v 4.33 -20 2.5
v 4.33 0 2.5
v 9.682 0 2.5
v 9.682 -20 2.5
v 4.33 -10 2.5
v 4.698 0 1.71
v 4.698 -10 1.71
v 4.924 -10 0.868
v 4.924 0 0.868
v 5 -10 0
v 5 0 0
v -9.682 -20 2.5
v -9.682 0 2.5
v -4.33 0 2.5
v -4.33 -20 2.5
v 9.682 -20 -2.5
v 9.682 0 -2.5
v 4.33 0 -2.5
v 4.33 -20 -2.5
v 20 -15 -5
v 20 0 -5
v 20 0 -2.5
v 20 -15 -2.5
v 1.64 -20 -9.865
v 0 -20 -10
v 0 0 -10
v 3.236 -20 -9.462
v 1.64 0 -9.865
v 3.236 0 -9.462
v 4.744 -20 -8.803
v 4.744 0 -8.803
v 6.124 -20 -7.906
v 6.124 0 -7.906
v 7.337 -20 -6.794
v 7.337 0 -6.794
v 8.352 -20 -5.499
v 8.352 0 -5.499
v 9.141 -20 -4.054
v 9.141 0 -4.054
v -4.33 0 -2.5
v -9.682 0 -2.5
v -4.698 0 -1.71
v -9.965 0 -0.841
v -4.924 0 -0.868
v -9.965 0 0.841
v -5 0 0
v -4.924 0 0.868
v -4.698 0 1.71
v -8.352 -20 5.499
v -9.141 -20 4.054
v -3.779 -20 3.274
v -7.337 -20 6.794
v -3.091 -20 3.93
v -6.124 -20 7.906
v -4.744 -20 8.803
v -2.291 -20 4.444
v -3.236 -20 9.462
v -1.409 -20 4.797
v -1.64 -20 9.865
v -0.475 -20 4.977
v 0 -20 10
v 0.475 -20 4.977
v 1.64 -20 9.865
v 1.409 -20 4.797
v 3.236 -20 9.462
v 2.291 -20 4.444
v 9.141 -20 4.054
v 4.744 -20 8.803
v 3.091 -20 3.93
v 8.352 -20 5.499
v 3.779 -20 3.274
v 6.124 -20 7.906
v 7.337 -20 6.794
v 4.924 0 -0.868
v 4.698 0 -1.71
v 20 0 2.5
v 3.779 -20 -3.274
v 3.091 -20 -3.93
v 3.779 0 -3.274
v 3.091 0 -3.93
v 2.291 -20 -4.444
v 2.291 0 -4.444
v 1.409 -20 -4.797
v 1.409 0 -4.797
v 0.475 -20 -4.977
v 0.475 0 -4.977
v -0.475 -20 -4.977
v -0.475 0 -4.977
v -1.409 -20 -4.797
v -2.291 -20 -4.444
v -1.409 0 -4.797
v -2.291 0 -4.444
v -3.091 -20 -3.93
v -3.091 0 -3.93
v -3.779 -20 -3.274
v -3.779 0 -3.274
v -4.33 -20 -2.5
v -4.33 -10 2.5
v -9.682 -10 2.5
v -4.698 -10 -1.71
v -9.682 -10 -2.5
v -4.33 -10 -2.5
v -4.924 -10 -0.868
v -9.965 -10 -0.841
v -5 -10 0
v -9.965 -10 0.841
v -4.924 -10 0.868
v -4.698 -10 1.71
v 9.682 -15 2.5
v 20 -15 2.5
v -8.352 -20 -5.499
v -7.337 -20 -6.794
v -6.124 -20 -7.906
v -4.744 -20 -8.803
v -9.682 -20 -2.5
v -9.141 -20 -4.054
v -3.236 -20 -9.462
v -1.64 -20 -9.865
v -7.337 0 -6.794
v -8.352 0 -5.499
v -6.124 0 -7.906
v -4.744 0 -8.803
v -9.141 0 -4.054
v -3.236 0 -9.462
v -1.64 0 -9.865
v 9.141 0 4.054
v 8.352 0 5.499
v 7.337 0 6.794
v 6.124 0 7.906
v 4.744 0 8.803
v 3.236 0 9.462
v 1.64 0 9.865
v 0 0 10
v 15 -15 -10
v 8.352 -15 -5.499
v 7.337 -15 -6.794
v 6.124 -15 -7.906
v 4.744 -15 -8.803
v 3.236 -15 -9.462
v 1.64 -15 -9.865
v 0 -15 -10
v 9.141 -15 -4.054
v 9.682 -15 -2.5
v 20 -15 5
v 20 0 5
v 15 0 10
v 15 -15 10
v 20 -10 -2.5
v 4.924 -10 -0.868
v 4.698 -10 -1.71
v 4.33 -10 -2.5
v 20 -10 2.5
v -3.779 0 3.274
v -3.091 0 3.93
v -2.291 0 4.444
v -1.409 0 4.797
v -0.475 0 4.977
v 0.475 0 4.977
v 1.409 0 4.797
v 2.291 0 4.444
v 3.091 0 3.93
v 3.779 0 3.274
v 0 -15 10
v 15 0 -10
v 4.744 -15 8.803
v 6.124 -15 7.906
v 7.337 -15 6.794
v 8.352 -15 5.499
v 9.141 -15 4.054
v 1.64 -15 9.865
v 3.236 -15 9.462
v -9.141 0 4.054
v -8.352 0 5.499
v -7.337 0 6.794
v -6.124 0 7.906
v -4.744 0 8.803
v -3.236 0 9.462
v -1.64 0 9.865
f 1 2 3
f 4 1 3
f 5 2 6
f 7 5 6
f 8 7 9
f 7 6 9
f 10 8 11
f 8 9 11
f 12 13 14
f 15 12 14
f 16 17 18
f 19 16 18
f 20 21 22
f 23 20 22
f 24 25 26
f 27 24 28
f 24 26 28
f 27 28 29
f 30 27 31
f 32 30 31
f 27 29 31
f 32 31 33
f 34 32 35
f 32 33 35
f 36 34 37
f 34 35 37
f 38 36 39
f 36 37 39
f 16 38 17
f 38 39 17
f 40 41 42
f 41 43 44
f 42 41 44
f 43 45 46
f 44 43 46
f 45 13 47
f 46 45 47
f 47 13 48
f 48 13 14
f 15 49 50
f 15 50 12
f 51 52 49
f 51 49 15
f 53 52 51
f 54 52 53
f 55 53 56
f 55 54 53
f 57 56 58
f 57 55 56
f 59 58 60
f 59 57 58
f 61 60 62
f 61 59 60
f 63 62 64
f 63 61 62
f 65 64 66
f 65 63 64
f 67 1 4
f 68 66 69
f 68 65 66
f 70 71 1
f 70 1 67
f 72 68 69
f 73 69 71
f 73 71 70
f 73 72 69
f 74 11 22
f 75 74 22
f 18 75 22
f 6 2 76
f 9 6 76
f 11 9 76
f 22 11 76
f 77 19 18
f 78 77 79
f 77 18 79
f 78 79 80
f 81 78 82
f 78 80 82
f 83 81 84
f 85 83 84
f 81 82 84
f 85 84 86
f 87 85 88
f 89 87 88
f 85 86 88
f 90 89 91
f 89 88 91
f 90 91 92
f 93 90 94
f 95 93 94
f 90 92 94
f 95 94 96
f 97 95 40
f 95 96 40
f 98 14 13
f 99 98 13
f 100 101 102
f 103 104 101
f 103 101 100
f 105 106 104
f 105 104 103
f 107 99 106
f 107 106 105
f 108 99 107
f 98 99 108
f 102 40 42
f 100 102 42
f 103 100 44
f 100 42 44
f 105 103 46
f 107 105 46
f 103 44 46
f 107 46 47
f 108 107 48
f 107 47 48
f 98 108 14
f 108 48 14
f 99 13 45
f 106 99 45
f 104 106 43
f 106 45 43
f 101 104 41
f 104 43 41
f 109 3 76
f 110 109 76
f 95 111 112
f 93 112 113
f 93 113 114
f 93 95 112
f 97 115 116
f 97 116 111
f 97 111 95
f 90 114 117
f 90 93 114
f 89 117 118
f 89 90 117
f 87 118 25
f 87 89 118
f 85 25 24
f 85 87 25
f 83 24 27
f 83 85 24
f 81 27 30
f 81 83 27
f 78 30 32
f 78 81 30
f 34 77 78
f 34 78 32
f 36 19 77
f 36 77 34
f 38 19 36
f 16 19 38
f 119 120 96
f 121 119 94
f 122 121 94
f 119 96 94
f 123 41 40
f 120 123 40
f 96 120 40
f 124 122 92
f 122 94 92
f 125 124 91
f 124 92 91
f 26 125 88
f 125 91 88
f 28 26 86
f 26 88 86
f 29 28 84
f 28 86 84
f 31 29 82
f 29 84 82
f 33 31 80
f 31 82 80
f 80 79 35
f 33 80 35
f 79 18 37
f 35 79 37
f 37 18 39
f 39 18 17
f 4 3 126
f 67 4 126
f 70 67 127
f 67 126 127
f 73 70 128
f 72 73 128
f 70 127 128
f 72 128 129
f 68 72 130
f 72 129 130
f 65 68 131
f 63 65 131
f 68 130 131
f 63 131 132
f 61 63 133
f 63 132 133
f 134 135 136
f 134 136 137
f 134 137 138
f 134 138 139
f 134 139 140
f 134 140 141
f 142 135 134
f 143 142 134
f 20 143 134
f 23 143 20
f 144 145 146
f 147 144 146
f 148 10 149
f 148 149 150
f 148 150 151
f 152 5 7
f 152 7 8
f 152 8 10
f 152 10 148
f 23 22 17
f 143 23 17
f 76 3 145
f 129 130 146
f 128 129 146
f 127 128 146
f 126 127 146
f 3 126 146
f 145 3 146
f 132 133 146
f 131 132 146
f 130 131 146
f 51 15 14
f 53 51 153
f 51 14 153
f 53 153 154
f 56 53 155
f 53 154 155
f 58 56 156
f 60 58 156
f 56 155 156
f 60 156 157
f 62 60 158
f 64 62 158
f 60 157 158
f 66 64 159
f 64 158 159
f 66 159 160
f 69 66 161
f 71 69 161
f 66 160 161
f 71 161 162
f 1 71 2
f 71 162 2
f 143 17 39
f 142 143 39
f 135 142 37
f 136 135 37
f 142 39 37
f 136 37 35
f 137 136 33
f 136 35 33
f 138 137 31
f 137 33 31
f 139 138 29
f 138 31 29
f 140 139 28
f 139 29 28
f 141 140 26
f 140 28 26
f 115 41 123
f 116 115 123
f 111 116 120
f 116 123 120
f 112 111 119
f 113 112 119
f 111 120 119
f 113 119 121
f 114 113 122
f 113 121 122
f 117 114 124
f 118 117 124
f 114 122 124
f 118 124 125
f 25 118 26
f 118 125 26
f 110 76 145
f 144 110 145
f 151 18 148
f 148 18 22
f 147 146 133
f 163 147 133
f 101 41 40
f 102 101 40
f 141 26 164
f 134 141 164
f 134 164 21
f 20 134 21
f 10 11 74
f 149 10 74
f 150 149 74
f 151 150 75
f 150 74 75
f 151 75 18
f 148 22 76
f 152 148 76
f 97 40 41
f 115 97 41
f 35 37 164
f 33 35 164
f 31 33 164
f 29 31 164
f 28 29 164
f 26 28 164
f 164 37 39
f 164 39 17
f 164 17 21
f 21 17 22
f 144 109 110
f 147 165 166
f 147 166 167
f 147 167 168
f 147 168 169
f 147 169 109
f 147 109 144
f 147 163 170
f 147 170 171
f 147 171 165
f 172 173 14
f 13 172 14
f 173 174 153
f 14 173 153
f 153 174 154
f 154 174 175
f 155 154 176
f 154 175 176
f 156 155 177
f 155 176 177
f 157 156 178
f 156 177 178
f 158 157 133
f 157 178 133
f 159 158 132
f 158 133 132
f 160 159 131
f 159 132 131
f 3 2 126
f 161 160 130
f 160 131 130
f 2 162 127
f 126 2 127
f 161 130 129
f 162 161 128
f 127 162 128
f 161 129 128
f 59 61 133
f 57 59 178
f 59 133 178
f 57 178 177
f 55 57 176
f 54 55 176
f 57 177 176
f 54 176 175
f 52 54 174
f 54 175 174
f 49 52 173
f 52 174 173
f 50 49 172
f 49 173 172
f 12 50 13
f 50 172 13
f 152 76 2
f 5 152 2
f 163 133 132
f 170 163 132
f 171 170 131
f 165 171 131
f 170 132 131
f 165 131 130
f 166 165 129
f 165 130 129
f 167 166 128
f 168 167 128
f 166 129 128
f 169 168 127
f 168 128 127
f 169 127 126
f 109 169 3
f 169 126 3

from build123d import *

# Parameters (mm, degrees)
F1_DEPTH = 20
F2_DEPTH = 10
F3_DEPTH = 15


with BuildPart() as f1:
    # F0 (on Front) → F1 (new body)
    with BuildSketch(Plane.XZ):
        with BuildLine():
            ThreePointArc((-4.330127, 2.5), (0, 5), (4.330127, 2.5))
            Line((4.330127, 2.5), (9.682458, 2.5))
            ThreePointArc((9.682458, 2.5), (6.123724, 7.905694), (0, 10))
            ThreePointArc((0, 10), (-6.123724, 7.905694), (-9.682458, 2.5))
            Line((-9.682458, 2.5), (-4.330127, 2.5))
        make_face()
        with BuildLine():
            Line((9.682458, -2.5), (4.330127, -2.5))
            ThreePointArc((4.330127, -2.5), (0, -5), (-4.330127, -2.5))
            Line((-4.330127, -2.5), (-9.682458, -2.5))
            ThreePointArc((-9.682458, -2.5), (-6.123724, -7.905694), (0, -10))
            ThreePointArc((0, -10), (6.123724, -7.905694), (9.682458, -2.5))
        make_face()
    extrude(amount=F1_DEPTH)


with BuildPart() as f2:
    # F0 (on Front) → F2 (new body)
    with BuildSketch(Plane.XZ):
        with BuildLine():
            ThreePointArc((-4.330127, -2.5), (-5, 0), (-4.330127, 2.5))
            Line((-4.330127, 2.5), (-9.682458, 2.5))
            ThreePointArc((-9.682458, 2.5), (-10, 0), (-9.682458, -2.5))
            Line((-9.682458, -2.5), (-4.330127, -2.5))
        make_face()
        with BuildLine():
            ThreePointArc((4.330127, 2.5), (4.829629, 1.294095), (5, 0))
            ThreePointArc((5, 0), (4.829629, -1.294095), (4.330127, -2.5))
            Line((4.330127, -2.5), (9.682458, -2.5))
            Line((9.682458, -2.5), (20, -2.5))
            Line((20, -2.5), (20, 2.5))
            Line((20, 2.5), (9.682458, 2.5))
            Line((9.682458, 2.5), (4.330127, 2.5))
        make_face()
    extrude(amount=F2_DEPTH)


with BuildPart() as f3:
    # F0 (on Front) → F3 (new body)
    with BuildSketch(Plane.XZ):
        with BuildLine():
            ThreePointArc((0, 10), (6.123724, 7.905694), (9.682458, 2.5))
            Line((9.682458, 2.5), (20, 2.5))
            Line((20, 2.5), (20, 5))
            Line((20, 5), (15, 10))
            Line((15, 10), (0, 10))
        make_face()
        with BuildLine():
            Line((20, -2.5), (9.682458, -2.5))
            ThreePointArc((9.682458, -2.5), (6.123724, -7.905694), (0, -10))
            Line((0, -10), (15, -10))
            Line((15, -10), (20, -5))
            Line((20, -5), (20, -2.5))
        make_face()
    extrude(amount=F3_DEPTH)


solid = Compound([f1.part, f2.part, f3.part])
